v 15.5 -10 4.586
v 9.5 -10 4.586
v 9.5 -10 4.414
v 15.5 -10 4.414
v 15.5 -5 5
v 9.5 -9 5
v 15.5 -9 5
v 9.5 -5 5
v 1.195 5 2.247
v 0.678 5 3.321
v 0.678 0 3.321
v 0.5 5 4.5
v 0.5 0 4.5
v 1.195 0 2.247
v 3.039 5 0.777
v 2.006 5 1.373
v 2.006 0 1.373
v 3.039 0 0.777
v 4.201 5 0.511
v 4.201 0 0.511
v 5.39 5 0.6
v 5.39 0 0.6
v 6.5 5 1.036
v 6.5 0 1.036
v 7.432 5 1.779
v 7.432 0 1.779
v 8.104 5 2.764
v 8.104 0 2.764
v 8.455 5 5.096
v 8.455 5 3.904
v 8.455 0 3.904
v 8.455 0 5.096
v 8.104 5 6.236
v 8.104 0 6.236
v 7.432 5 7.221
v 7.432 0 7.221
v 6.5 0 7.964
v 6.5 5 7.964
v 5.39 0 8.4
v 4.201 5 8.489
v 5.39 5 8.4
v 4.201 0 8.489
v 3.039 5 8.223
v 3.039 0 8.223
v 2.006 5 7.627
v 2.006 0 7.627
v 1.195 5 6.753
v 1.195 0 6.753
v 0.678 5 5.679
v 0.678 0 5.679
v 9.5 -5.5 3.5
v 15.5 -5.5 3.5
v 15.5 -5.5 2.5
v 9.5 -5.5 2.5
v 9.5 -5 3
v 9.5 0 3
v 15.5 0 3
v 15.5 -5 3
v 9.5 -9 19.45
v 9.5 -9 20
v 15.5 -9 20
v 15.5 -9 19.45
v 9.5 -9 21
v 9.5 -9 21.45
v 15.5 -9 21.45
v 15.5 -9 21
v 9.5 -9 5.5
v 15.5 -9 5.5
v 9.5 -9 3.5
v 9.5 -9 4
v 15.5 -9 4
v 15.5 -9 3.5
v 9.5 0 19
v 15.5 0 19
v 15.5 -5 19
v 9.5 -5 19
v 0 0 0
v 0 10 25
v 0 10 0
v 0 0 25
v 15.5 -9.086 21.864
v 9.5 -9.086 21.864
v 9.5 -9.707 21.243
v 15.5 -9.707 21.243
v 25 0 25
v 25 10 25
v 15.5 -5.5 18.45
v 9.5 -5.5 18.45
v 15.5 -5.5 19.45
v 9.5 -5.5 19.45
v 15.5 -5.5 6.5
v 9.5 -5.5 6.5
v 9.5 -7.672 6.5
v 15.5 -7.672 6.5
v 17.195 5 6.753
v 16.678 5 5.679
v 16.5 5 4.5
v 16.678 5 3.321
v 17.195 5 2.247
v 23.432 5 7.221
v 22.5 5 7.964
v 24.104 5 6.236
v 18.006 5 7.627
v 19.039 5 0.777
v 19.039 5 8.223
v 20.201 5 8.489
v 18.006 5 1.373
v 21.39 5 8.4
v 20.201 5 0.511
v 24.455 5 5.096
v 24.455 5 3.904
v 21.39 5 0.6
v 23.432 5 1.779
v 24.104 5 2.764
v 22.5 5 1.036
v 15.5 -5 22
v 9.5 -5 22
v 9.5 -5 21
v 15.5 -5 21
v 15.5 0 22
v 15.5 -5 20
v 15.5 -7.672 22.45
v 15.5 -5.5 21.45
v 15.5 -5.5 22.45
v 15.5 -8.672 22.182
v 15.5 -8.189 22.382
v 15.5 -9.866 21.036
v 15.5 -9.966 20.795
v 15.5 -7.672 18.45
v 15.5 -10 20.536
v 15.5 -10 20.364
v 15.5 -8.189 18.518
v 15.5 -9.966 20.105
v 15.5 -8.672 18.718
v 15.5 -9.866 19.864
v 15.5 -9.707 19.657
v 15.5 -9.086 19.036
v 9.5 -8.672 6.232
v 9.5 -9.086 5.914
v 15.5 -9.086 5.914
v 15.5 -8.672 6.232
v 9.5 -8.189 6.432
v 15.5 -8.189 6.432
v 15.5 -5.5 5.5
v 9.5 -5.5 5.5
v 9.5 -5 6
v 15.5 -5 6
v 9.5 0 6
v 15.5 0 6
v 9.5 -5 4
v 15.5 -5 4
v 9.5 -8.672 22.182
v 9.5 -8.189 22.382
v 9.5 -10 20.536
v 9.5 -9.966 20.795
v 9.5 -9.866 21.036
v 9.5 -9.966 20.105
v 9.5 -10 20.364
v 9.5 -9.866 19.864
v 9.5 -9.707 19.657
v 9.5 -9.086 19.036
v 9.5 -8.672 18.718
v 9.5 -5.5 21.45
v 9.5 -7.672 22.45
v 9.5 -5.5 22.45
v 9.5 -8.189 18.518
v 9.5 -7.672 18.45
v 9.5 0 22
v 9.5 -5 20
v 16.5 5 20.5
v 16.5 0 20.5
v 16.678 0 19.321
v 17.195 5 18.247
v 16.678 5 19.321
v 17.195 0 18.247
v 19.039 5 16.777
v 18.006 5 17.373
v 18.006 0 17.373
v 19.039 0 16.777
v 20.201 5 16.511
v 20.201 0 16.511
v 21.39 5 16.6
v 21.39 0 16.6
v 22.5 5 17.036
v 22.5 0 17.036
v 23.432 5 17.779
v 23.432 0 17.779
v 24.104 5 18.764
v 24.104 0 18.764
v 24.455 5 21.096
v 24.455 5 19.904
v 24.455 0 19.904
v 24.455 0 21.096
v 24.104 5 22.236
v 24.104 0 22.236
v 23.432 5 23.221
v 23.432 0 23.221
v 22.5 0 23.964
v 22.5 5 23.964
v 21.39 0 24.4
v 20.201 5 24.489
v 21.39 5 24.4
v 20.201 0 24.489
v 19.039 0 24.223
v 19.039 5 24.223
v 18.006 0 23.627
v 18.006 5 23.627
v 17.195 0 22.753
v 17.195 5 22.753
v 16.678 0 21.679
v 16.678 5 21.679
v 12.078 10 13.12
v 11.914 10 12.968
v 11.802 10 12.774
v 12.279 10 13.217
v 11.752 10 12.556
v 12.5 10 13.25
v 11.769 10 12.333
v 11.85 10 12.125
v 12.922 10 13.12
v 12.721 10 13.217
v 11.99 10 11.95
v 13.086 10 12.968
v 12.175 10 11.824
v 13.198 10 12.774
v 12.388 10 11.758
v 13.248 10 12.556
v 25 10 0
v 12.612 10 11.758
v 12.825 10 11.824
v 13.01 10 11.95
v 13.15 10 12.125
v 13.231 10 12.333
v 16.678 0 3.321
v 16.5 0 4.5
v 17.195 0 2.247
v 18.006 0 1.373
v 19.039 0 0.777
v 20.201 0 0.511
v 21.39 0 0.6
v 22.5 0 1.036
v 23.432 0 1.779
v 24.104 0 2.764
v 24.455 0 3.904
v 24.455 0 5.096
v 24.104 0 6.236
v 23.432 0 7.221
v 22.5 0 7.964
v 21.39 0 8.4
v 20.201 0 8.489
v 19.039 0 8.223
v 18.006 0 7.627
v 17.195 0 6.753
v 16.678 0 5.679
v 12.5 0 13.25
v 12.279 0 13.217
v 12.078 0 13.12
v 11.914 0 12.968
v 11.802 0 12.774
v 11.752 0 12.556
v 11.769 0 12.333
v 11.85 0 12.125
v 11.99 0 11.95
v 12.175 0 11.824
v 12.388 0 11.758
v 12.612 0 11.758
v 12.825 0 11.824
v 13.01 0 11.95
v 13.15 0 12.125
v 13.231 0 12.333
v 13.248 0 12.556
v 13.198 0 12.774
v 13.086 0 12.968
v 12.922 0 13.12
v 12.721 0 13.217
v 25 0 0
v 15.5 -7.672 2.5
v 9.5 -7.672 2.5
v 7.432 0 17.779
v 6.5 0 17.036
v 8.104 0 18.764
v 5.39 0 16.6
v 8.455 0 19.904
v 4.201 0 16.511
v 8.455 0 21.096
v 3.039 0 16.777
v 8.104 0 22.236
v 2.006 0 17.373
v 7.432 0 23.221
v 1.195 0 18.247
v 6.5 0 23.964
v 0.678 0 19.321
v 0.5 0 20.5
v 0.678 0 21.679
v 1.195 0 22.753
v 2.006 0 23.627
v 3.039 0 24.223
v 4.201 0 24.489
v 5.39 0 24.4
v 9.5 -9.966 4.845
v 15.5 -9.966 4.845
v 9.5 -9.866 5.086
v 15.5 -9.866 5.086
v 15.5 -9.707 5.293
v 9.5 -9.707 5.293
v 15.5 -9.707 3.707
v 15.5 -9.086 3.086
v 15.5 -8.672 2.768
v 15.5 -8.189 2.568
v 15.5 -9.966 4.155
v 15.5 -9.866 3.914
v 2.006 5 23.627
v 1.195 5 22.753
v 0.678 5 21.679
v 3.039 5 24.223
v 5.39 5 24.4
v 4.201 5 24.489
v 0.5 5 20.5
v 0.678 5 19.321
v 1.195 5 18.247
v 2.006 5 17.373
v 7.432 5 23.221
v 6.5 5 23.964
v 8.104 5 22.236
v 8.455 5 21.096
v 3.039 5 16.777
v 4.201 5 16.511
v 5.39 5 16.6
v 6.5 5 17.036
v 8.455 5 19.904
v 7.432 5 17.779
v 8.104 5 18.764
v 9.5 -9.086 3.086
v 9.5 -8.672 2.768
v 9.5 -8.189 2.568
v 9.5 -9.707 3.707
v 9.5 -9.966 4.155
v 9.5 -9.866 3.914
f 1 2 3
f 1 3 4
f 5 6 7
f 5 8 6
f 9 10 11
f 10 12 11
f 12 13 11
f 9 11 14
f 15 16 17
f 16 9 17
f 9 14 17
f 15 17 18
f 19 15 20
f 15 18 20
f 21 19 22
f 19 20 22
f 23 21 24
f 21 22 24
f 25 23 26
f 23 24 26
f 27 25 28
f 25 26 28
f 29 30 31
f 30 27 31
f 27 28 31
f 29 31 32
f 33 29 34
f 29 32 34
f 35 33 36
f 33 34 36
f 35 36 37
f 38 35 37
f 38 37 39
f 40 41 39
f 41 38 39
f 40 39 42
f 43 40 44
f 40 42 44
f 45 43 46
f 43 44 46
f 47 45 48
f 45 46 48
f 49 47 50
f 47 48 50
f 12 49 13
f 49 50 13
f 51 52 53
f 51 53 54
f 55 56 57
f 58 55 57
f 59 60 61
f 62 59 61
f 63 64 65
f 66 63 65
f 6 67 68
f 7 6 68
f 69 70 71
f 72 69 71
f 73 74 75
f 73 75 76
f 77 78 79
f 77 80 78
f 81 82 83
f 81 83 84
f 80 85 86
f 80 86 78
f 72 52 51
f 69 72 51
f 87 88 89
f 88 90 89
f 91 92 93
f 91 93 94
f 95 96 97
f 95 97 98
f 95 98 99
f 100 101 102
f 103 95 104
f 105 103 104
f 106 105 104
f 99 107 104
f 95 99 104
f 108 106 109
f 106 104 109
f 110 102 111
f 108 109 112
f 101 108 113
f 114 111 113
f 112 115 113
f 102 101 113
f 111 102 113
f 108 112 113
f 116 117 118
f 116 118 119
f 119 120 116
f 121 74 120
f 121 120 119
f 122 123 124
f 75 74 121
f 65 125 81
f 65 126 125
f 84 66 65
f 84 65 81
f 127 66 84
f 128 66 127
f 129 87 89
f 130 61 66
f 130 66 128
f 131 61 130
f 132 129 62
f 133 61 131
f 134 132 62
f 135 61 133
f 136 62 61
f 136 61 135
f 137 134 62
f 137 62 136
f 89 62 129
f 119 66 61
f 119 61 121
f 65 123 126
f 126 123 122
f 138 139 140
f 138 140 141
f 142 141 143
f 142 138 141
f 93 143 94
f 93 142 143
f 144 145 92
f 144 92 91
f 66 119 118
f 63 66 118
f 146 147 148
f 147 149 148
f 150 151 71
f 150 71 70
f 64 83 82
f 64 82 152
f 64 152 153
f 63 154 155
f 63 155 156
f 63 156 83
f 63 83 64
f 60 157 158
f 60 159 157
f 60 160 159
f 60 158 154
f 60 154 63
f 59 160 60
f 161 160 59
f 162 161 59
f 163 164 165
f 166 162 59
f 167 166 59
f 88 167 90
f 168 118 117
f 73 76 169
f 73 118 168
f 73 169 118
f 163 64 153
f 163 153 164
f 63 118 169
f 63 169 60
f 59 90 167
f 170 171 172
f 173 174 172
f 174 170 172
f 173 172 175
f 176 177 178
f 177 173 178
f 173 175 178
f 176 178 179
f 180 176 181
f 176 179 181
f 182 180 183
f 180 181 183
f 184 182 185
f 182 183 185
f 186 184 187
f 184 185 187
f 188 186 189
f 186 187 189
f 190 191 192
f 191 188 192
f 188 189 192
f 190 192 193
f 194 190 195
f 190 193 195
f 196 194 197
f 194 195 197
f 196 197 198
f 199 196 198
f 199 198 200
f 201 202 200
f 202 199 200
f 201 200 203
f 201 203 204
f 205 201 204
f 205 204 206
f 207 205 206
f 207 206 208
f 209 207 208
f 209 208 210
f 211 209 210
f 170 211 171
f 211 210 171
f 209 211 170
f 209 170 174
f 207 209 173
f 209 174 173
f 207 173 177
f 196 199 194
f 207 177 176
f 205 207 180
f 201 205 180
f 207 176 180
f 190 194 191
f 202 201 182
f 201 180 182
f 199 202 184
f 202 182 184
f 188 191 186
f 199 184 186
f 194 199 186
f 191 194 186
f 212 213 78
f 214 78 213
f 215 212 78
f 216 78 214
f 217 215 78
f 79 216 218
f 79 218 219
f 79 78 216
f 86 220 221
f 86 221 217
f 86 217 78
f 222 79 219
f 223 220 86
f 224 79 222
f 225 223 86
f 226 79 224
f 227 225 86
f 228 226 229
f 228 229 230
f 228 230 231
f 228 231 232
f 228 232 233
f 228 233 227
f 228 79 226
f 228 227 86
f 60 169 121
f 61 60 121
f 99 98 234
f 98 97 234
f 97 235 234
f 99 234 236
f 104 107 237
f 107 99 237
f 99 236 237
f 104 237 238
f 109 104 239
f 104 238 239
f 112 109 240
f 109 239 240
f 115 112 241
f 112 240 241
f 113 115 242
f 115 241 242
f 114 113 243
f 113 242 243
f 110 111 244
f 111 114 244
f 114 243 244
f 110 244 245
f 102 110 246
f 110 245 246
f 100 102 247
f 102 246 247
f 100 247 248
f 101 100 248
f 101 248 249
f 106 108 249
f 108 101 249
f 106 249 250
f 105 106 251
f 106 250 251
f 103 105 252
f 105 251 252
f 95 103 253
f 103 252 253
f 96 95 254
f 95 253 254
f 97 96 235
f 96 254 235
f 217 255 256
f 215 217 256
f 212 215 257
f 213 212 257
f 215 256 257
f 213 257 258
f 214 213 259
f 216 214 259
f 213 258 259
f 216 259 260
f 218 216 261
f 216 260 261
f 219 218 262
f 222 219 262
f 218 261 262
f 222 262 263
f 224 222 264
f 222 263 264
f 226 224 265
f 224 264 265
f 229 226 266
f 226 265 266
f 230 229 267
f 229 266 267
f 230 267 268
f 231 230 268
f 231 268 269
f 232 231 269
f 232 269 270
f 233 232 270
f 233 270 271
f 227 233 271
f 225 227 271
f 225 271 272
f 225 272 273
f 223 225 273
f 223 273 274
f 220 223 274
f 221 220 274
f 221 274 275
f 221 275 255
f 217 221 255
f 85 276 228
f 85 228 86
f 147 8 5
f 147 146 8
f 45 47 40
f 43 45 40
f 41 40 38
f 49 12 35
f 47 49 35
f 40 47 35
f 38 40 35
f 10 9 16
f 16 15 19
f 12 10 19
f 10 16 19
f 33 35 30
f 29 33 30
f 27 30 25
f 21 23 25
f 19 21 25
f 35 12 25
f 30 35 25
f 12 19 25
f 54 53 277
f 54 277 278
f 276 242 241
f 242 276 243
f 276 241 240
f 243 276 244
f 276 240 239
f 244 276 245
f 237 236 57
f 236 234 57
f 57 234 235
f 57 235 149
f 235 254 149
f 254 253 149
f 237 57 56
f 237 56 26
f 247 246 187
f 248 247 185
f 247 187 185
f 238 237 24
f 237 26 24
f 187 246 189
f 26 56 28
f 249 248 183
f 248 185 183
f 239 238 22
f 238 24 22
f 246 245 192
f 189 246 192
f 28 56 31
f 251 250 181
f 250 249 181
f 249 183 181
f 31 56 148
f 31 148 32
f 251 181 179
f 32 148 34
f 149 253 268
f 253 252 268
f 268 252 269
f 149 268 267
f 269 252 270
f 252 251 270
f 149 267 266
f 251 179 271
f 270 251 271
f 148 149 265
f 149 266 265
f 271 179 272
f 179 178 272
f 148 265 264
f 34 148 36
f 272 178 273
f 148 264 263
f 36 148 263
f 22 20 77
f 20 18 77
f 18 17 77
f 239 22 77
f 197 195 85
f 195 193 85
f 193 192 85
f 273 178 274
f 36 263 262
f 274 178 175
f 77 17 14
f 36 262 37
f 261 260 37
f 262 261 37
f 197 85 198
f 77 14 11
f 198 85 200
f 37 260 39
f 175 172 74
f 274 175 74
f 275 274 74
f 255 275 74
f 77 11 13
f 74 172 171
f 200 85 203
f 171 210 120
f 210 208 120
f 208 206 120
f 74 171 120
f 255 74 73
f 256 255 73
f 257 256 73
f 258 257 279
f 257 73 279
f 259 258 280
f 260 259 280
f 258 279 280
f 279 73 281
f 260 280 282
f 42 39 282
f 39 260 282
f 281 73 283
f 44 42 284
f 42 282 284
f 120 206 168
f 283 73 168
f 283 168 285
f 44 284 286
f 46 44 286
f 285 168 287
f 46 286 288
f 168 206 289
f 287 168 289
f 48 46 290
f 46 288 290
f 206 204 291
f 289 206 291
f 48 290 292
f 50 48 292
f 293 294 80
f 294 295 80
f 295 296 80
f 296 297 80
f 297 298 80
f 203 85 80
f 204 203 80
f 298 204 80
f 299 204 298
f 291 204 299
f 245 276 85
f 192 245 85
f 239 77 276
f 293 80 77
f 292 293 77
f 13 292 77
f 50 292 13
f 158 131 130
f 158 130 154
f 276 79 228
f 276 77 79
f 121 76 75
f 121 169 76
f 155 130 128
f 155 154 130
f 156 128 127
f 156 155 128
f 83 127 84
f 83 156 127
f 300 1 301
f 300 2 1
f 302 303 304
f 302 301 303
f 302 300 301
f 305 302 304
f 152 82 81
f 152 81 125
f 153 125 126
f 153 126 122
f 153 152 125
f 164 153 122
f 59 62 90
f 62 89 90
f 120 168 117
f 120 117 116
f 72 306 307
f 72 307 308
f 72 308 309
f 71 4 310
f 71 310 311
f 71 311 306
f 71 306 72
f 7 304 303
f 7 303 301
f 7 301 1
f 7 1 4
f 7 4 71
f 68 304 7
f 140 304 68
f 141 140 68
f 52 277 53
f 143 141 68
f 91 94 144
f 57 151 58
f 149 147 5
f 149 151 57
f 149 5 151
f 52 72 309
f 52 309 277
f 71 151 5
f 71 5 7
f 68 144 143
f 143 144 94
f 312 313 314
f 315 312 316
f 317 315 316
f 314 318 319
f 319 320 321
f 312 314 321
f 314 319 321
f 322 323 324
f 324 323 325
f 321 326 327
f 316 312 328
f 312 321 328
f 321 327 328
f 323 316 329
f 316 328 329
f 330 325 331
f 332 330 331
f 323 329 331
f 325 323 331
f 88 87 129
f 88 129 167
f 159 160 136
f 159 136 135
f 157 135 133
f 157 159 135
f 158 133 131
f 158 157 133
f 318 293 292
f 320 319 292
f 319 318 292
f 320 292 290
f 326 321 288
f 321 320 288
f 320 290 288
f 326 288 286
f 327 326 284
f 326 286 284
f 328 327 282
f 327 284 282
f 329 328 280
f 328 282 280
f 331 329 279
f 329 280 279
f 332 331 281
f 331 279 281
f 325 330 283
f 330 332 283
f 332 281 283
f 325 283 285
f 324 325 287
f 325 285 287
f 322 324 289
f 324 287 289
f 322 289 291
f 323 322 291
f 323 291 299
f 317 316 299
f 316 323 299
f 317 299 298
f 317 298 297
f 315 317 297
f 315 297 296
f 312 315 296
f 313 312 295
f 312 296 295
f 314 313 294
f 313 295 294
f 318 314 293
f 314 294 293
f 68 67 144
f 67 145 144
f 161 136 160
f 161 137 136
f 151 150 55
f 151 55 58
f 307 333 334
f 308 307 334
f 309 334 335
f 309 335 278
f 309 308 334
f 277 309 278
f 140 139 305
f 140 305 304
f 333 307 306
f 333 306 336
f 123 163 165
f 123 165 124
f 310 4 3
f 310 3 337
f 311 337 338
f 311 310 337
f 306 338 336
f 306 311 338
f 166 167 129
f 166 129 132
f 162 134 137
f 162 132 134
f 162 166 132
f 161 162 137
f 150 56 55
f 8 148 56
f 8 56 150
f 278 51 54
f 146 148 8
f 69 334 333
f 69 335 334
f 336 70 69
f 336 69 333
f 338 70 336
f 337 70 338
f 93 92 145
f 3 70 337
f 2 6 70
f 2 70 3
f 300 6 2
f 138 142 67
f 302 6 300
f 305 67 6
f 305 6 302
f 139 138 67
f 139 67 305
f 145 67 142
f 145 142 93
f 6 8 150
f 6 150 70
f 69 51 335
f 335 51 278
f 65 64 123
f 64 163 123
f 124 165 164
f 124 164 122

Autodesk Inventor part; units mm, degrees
ref_plane "YZ Plane" through (0, 0, 0) normal (1, 0, 0) x (0, 1, 0)
ref_plane "XZ Plane" through (0, 0, 0) normal (0, 1, 0) x (-1, 0, 0)
ref_plane "XY Plane" through (0, 0, 0) normal (0, 0, 1) x (1, 0, 0)
sketch "Sketch1" plane through (0, 0, 0) normal (0, 1, 0) x (-1, 0, 0)
  line L0 (0, 0) -> (-25, 0)
  line L1 (-25, 0) -> (-25, 25)
  line L2 (-25, 25) -> (0, 25)
  line L3 (0, 25) -> (0, 0)
  circle A0 centre (-4.5, 4.5) radius 4
  circle A1 centre (-4.5, 20.5) radius 4
  circle A2 centre (-20.5, 20.5) radius 4
  circle A3 centre (-20.5, 4.5) radius 4
  dimension "d0" = 25
  dimension "d1" = 25
  dimension "d2" = 8
  dimension "d3" = 8
  dimension "d4" = 8
  dimension "d5" = 8
extrude "Extrusion1" add sketch "Sketch1" along normal blind 5
sketch "Sketch2" plane through (0, 5, 0) normal (0, 1, 0) x (1, 0, 0)
  line L0 (0, 0) -> (0, -25) projected
  line L1 (25, -25) -> (25, 0) projected
  line L2 (0, -25) -> (25, -25)
  line L3 (25, -25) -> (25, 0)
  line L4 (25, 0) -> (0, 0)
  line L5 (0, 0) -> (0, -25)
extrude "Extrusion2" add sketch "Sketch2" along normal blind 5
sketch "Sketch4" plane through (0, 0, 0) normal (0, -1, 0) x (1, 0, 0)
  line L0 (9.5, 3) -> (15.5, 3)
  line L1 (15.5, 3) -> (15.5, 6)
  line L2 (15.5, 6) -> (9.5, 6)
  line L3 (9.5, 6) -> (9.5, 3)
  line L4 (9.5, 22) -> (15.5, 22)
  line L5 (15.5, 22) -> (15.5, 19)
  line L6 (15.5, 19) -> (9.5, 19)
  line L7 (9.5, 19) -> (9.5, 22)
  point P0 (0, 0)
  dimension "d12" = 6
  dimension "d13" = 3
  dimension "d14" = 6
  dimension "d15" = 3
extrude "Extrusion3" add sketch "Sketch4" along normal blind 5
sketch "Sketch5" plane through (0, -5, 0) normal (0, -1, 0) x (1, 0, 0)
  line L0 (15.5, 3) -> (15.5, 6) projected
  line L1 (9.5, 6) -> (9.5, 3) projected
  line L2 (15.5, 4) -> (9.5, 4)
  line L3 (9.5, 4) -> (9.5, 5)
  line L4 (9.5, 5) -> (15.5, 5)
  line L5 (15.5, 5) -> (15.5, 4)
  line L6 (15.5, 19) -> (15.5, 22) projected
  line L7 (15.5, 21) -> (9.5, 21)
  line L8 (9.5, 21) -> (9.5, 20)
  line L9 (9.5, 20) -> (15.5, 20)
  line L10 (15.5, 20) -> (15.5, 21)
  point P0 (0, 0)
  dimension "d18" = 1
  dimension "d19" = 6
  dimension "d20" = 1
extrude "Extrusion4" add sketch "Sketch5" along normal blind 4
sketch "Sketch6" plane through (0, -9, 0) normal (0, -1, 0) x (1, 0, 0)
  line L0 (15.5, 6) -> (15.5, 3) projected
  line L1 (9.5, 3) -> (9.5, 6) projected
  line L2 (15.5, 5.5) -> (9.5, 5.5)
  line L3 (9.5, 5.5) -> (9.5, 3.5)
  line L4 (9.5, 3.5) -> (15.5, 3.5)
  line L5 (15.5, 3.5) -> (15.5, 5.5)
  line L6 (15.5, 22) -> (15.5, 19) projected
  line L7 (15.5, 21.45) -> (9.5, 21.45)
  line L8 (9.5, 21.45) -> (9.5, 19.45)
  line L9 (9.5, 19.45) -> (15.5, 19.45)
  line L10 (15.5, 19.45) -> (15.5, 21.45)
  point P0 (0, 0)
  dimension "d23" = 2
  dimension "d24" = 6
  dimension "d25" = 2
extrude "Extrusion5" add sketch "Sketch6" along normal blind 1
sketch "Sketch7" plane through (15.5, -9, 19.45) normal (0, 0, -1) x (-1, 0, 0)
  line L0 (0, 0) -> (0, -1) projected
  line L1 (6, 4) -> (6, 0) projected
  line L2 (0, -1) -> (6, -1)
  line L3 (6, -1) -> (6, 3.5)
  line L4 (6, 3.5) -> (0, 3.5)
  line L5 (0, 3.5) -> (0, -1)
  point P0 (15.5, 9)
  dimension "d28" = 4.5
extrude "Extrusion6" add sketch "Sketch7" along normal blind 1
sketch "Sketch8" plane through (9.5, -9, 21.45) normal (0, 0, 1) x (1, 0, 0)
  line L0 (6, 0) -> (6, -1) projected
  line L1 (0, 4) -> (0, 0) projected
  line L2 (6, -1) -> (0, -1)
  line L3 (0, -1) -> (0, 3.5)
  line L4 (0, 3.5) -> (6, 3.5)
  line L5 (6, 3.5) -> (6, -1)
  point P0 (-9.5, 9)
  dimension "d31" = 4.5
extrude "Extrusion7" add sketch "Sketch8" along normal blind 1
sketch "Sketch9" plane through (9.5, -9, 5.5) normal (0, 0, 1) x (1, 0, 0)
  line L0 (6, -1) -> (0, -1) projected
  line L1 (0, 4) -> (0, 0) projected
  line L2 (6, -1) -> (0, -1)
  line L3 (0, -1) -> (0, 3.5)
  line L4 (0, 3.5) -> (6, 3.5)
  line L5 (6, 3.5) -> (6, -1)
  point P0 (-9.5, 9)
  dimension "d34" = 4.5
extrude "Extrusion8" add sketch "Sketch9" along normal blind 1
sketch "Sketch10" plane through (15.5, -9, 3.5) normal (0, 0, -1) x (-1, 0, 0)
  line L0 (6, 0) -> (6, -1) projected
  line L1 (0, 3.5) -> (6, 3.5) projected
  line L2 (6, -1) -> (0, -1)
  line L3 (0, -1) -> (0, 3.5)
  line L4 (0, 3.5) -> (6, 3.5)
  line L5 (6, 3.5) -> (6, -1)
  point P0 (15.5, 9)
  dimension "d37" = 4.5
extrude "Extrusion9" add sketch "Sketch10" along normal blind 1
chamfer "Chamfer1" distance 1.5 angle 45 1 edges at (12.5, -10, 2.5)
chamfer "Chamfer2" distance 1.5 angle 45 1 edges at (12.5, -10, 6.5)
fillet "Fillet1" radius 2 2 edges at (12.5, -8.5, 2.5) (12.5, -8.5, 6.5)
fillet "Fillet2" radius 1 2 edges at (12.5, -10, 5) (12.5, -10, 4)
chamfer "Chamfer3" distance 1.5 angle 45 2 edges at (12.5, -10, 18.45) (12.5, -10, 22.45)
fillet "Fillet3" radius 1 2 edges at (12.5, -10, 20.95) (12.5, -10, 19.95)
fillet "Fillet4" radius 2 2 edges at (12.5, -8.5, 22.45) (12.5, -8.5, 18.45)
sketch "Sketch11" plane through (0, 10, 0) normal (0, 1, 0) x (1, 0, 0)
  circle A0 centre (12.5, -12.5) radius 0.75
  point P0 (0, 0)
  dimension "d53" = 1.5
hole "Hole1" at (12.5, 10, 12.5) direction (0, -1, 0) diameter 1.5 depth 10
properties part number "SiPM outer housing"
